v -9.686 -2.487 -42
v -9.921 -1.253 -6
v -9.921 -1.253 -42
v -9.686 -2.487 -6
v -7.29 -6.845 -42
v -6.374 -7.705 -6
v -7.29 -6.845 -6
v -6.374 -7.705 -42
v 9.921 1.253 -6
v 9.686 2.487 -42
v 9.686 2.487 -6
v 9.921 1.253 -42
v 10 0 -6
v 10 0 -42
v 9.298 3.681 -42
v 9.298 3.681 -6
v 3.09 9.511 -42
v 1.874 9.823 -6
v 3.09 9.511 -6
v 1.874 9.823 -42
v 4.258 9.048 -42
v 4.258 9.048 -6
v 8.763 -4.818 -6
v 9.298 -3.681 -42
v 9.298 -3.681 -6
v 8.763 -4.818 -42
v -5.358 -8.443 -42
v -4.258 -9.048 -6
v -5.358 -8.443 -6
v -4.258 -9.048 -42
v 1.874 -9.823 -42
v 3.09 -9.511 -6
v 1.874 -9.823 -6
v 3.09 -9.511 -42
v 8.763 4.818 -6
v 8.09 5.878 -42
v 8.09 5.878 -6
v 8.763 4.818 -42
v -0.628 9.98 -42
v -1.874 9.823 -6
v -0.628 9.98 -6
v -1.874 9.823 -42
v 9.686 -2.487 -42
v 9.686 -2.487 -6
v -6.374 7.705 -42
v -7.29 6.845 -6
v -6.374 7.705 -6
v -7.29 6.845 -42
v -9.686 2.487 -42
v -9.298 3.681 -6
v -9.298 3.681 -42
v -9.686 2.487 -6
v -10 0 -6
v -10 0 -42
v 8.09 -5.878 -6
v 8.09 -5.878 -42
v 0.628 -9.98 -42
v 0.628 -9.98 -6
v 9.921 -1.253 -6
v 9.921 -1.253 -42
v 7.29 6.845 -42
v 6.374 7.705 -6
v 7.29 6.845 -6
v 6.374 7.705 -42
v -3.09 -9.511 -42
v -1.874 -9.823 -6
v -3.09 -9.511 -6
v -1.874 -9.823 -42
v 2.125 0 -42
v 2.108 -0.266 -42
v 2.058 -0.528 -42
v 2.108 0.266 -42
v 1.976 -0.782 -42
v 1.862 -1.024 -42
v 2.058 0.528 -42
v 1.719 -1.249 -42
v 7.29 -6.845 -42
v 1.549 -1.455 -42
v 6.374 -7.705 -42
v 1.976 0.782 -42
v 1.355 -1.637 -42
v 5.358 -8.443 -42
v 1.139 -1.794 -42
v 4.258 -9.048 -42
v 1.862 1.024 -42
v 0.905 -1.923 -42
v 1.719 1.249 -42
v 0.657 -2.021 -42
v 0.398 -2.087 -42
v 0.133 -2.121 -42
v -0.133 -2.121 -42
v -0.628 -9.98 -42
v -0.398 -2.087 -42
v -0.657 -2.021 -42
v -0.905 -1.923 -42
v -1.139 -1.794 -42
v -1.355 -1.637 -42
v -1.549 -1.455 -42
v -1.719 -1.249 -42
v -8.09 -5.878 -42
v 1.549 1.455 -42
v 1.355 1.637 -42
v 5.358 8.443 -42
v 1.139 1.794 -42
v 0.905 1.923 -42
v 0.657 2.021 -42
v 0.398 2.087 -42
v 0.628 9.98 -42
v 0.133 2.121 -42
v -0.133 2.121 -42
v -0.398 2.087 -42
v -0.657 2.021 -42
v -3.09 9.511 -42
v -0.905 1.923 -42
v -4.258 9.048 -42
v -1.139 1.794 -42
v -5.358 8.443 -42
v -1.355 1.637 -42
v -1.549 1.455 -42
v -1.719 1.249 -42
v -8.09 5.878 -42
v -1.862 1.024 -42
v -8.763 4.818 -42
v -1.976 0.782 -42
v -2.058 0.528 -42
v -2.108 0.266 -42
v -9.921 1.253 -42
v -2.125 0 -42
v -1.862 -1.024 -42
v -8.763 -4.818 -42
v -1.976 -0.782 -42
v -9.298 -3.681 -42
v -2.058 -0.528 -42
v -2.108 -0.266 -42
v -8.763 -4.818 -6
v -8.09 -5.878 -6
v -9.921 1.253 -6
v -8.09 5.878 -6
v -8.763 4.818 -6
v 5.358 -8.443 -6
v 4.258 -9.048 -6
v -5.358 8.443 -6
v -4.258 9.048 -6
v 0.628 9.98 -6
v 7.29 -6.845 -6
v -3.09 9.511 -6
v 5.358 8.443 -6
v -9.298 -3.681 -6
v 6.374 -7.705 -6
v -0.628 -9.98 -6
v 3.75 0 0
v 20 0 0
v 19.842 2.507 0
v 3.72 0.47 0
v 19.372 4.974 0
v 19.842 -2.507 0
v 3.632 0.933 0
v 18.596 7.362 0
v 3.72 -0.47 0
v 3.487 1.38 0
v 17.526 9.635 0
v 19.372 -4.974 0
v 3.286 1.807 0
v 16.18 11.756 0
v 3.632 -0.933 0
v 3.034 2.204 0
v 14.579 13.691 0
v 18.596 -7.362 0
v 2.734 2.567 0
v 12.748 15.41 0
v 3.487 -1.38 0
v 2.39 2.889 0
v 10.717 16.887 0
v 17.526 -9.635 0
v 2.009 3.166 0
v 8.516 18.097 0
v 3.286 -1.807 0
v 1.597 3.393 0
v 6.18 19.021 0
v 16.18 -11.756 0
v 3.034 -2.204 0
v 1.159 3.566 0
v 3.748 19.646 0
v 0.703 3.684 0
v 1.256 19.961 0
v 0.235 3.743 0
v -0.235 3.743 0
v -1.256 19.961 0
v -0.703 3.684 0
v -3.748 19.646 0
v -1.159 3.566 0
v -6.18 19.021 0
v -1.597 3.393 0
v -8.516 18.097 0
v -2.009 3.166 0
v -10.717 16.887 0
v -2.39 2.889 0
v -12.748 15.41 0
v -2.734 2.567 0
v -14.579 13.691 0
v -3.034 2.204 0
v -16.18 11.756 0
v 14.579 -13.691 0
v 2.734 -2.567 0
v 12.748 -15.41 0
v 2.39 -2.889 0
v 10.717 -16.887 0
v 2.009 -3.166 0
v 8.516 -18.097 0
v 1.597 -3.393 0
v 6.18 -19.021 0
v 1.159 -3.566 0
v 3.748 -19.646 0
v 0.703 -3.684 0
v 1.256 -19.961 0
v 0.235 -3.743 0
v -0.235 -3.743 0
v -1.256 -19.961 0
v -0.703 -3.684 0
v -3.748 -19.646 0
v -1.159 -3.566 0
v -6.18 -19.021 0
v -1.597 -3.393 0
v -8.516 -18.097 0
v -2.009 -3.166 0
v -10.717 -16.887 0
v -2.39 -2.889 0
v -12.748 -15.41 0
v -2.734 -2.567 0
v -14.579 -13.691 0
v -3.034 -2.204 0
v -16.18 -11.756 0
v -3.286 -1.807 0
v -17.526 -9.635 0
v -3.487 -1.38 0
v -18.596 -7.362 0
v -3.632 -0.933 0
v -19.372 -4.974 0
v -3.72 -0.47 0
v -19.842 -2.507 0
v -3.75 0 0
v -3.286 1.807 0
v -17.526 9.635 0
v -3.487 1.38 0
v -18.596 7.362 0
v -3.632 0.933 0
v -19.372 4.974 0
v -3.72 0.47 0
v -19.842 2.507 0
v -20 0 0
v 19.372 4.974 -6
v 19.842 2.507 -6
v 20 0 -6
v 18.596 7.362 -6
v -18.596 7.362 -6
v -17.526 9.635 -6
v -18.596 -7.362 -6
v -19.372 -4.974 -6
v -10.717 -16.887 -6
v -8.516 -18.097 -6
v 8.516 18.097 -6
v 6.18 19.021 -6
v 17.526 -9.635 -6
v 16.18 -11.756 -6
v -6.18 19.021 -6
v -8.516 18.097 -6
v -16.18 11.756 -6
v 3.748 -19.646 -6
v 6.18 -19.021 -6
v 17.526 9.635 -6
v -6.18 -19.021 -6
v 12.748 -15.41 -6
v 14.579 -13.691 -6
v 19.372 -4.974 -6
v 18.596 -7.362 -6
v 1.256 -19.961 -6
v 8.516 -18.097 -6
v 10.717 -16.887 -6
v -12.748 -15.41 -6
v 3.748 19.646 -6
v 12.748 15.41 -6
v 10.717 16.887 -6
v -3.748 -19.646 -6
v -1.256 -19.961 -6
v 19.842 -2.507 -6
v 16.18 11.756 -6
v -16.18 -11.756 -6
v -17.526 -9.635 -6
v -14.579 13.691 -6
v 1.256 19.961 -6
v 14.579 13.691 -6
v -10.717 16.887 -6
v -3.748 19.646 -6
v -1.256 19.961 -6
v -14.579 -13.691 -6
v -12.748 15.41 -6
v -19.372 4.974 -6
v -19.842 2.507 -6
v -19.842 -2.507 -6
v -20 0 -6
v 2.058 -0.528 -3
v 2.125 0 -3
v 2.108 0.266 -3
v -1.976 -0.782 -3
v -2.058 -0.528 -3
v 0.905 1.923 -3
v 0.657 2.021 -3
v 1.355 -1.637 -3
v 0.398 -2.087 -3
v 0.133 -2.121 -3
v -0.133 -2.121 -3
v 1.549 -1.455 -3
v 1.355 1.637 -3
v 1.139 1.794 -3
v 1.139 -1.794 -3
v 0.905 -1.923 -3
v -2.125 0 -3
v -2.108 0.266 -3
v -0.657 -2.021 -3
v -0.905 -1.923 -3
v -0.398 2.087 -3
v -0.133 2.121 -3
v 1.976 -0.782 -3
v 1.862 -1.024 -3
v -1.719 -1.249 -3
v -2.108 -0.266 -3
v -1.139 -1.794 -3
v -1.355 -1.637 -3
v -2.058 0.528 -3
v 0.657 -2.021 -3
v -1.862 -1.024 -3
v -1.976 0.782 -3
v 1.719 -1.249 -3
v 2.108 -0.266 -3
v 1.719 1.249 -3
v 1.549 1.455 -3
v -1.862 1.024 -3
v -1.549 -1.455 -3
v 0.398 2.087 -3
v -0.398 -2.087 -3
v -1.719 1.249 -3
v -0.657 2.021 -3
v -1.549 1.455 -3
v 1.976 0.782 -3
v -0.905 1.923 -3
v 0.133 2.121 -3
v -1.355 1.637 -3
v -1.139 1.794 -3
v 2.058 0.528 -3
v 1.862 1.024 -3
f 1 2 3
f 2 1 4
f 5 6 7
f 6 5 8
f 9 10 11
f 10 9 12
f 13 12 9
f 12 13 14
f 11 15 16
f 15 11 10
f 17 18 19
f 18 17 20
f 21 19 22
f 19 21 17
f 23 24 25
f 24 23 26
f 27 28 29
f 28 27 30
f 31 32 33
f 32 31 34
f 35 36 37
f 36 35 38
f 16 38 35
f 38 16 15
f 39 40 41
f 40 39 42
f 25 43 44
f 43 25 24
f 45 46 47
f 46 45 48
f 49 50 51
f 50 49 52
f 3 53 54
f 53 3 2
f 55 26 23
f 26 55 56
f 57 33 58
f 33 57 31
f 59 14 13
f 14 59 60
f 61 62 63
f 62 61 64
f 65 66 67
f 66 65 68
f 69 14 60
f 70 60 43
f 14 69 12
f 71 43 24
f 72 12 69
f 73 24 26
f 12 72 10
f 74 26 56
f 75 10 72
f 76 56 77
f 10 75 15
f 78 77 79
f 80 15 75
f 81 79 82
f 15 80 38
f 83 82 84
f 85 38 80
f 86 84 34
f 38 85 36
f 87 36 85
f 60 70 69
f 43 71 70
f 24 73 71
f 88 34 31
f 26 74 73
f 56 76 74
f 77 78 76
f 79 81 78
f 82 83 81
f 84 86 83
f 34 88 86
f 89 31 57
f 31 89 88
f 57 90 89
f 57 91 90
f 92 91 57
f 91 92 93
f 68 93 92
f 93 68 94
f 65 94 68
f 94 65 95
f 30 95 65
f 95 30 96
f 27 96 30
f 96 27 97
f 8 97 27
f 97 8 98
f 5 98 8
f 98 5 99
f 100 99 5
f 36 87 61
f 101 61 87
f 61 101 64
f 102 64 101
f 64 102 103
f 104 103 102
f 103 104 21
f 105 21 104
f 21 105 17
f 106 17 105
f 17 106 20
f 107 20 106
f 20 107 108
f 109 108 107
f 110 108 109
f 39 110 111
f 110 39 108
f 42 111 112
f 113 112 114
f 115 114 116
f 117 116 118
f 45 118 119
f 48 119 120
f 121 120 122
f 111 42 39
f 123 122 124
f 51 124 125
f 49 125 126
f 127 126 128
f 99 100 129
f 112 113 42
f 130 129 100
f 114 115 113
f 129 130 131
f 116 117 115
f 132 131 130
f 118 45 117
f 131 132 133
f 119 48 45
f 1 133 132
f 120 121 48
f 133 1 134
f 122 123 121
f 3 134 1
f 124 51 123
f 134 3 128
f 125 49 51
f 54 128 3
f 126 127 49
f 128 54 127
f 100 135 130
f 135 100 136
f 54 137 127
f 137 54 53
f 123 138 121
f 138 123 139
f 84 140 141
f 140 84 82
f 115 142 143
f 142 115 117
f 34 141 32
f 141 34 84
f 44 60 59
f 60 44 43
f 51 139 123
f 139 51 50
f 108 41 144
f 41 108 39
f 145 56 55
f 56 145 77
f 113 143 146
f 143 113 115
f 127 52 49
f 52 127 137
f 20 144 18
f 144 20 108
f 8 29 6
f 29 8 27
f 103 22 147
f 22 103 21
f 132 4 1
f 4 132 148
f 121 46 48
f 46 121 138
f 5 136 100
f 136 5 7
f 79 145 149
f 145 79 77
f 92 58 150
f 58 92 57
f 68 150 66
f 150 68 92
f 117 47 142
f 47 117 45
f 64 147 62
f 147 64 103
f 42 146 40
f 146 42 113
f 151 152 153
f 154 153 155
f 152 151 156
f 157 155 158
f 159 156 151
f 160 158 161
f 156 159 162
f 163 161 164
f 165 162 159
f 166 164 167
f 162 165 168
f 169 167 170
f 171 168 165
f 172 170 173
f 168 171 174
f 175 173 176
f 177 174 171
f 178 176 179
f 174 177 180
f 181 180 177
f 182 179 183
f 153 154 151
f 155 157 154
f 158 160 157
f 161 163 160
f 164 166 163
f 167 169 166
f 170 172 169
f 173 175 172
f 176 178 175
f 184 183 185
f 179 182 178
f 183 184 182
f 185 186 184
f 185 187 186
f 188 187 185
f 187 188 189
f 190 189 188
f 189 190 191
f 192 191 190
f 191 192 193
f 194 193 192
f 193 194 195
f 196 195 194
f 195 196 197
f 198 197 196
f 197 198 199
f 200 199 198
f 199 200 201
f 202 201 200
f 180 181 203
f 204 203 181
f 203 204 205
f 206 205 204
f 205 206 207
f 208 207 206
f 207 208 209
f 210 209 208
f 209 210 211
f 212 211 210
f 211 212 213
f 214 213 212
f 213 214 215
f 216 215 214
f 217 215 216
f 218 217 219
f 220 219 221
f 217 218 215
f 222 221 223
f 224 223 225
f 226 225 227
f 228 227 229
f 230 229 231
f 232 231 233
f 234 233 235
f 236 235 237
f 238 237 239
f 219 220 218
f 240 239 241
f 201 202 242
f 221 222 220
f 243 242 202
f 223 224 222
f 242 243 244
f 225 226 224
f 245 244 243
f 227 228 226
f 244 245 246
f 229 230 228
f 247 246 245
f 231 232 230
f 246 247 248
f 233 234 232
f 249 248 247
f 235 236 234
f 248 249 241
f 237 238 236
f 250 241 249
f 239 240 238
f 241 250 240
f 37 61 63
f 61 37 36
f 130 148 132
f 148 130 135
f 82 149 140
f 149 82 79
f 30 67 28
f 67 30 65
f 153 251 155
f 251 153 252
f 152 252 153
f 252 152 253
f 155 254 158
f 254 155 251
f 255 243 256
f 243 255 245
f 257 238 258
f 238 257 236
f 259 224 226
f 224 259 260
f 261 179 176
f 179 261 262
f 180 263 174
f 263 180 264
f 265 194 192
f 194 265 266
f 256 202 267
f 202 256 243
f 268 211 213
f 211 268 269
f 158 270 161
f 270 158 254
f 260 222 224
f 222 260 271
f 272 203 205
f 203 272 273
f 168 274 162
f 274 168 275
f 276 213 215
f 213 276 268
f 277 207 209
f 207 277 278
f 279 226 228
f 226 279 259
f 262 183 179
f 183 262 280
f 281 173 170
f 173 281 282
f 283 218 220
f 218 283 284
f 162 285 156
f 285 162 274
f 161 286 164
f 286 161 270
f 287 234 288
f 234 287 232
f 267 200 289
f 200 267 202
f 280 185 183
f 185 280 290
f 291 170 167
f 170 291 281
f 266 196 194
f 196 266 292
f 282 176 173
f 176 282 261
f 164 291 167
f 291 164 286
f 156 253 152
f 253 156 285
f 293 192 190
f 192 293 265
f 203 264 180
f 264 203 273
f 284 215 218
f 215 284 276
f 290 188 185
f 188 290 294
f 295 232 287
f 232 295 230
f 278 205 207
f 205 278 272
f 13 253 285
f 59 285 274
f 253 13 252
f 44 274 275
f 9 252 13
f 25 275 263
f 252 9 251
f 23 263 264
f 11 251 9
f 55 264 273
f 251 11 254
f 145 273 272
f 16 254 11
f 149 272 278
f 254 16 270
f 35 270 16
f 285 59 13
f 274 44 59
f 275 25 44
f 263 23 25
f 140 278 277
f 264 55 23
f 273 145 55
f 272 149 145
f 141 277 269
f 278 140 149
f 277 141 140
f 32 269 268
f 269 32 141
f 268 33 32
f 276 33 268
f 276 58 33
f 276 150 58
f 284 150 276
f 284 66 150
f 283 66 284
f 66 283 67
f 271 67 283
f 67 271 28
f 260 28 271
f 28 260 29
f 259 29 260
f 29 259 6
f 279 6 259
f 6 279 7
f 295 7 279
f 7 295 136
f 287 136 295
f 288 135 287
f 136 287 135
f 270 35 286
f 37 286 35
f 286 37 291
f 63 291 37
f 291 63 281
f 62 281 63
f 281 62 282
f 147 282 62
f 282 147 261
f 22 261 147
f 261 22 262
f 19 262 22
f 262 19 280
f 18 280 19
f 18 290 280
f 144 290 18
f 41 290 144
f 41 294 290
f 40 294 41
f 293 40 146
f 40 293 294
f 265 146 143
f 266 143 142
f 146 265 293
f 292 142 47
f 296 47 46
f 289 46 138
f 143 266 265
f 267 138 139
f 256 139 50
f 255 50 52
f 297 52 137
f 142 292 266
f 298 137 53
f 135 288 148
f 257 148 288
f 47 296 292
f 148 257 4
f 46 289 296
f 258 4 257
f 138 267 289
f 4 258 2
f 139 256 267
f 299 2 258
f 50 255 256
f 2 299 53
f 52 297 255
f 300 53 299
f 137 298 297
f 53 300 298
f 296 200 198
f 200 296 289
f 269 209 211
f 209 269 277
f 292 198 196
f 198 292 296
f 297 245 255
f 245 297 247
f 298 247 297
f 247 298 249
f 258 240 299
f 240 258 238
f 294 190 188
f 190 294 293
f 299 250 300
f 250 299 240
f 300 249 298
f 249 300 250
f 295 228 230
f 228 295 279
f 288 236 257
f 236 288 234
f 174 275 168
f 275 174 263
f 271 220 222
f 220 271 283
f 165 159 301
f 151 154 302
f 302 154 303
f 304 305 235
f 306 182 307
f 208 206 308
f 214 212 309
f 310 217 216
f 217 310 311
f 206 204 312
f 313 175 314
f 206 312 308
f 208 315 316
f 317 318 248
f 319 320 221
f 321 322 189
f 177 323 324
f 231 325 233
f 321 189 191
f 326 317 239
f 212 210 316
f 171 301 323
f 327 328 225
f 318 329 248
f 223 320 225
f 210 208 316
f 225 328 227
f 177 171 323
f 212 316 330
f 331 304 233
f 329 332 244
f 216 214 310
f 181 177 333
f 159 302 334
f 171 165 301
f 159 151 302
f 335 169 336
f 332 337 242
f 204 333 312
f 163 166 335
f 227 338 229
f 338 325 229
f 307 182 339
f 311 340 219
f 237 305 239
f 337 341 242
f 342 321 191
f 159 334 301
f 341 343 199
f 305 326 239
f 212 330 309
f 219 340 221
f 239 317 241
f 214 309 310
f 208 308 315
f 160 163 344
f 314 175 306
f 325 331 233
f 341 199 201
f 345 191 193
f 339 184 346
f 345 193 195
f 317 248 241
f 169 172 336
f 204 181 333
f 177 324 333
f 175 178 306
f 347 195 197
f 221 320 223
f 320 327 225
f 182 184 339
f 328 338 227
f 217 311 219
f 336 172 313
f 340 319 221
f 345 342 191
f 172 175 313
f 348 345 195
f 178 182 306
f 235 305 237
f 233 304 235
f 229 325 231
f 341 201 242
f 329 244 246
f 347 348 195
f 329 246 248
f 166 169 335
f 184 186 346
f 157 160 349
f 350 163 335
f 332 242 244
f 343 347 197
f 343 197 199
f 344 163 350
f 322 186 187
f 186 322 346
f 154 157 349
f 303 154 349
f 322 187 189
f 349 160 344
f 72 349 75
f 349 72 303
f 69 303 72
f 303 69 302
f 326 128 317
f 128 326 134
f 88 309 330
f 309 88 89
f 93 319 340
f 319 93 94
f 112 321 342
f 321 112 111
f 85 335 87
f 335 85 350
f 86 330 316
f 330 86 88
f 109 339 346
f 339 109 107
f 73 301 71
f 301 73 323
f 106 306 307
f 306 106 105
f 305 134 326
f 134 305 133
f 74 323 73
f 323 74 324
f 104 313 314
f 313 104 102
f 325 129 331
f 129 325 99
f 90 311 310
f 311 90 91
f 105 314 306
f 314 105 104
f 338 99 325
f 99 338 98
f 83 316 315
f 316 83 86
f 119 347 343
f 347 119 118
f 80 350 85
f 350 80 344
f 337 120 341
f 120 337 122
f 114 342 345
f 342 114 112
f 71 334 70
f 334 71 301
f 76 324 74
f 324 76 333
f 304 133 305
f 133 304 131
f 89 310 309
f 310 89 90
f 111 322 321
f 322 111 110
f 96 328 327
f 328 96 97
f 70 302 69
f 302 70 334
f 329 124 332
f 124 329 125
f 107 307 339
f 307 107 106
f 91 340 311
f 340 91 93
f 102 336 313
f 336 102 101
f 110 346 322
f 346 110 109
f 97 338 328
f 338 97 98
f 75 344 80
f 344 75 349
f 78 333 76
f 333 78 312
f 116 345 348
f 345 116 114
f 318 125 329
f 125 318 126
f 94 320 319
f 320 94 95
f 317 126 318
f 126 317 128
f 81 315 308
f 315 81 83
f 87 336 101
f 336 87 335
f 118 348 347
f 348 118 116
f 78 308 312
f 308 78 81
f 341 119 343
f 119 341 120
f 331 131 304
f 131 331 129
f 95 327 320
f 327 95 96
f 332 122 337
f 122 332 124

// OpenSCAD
$fn = 50;


difference() {
	union() {
		translate(v = [0, 0, -42.0000000000]) {
			cylinder(h = 42, r = 10.0000000000);
		}
		translate(v = [0, 0, -6.0000000000]) {
			cylinder(h = 6, r = 20.0000000000);
		}
	}
	union() {
		translate(v = [0, 0, 0]) {
			rotate(a = [0, 0, 0]) {
				difference() {
					union() {
						#translate(v = [0, 0, -42.0000000000]) {
							cylinder(h = 42, r = 2.0000000000);
						}
						#translate(v = [0, 0, -3]) {
							cylinder(h = 3, r1 = 2.1250000000, r2 = 3.7500000000);
						}
						#translate(v = [0, 0, -42.0000000000]) {
							cylinder(h = 42, r = 2.1250000000);
						}
						#translate(v = [0, 0, -42.0000000000]) {
							cylinder(h = 42, r = 2.0000000000);
						}
					}
					union();
				}
			}
		}
	}
}
